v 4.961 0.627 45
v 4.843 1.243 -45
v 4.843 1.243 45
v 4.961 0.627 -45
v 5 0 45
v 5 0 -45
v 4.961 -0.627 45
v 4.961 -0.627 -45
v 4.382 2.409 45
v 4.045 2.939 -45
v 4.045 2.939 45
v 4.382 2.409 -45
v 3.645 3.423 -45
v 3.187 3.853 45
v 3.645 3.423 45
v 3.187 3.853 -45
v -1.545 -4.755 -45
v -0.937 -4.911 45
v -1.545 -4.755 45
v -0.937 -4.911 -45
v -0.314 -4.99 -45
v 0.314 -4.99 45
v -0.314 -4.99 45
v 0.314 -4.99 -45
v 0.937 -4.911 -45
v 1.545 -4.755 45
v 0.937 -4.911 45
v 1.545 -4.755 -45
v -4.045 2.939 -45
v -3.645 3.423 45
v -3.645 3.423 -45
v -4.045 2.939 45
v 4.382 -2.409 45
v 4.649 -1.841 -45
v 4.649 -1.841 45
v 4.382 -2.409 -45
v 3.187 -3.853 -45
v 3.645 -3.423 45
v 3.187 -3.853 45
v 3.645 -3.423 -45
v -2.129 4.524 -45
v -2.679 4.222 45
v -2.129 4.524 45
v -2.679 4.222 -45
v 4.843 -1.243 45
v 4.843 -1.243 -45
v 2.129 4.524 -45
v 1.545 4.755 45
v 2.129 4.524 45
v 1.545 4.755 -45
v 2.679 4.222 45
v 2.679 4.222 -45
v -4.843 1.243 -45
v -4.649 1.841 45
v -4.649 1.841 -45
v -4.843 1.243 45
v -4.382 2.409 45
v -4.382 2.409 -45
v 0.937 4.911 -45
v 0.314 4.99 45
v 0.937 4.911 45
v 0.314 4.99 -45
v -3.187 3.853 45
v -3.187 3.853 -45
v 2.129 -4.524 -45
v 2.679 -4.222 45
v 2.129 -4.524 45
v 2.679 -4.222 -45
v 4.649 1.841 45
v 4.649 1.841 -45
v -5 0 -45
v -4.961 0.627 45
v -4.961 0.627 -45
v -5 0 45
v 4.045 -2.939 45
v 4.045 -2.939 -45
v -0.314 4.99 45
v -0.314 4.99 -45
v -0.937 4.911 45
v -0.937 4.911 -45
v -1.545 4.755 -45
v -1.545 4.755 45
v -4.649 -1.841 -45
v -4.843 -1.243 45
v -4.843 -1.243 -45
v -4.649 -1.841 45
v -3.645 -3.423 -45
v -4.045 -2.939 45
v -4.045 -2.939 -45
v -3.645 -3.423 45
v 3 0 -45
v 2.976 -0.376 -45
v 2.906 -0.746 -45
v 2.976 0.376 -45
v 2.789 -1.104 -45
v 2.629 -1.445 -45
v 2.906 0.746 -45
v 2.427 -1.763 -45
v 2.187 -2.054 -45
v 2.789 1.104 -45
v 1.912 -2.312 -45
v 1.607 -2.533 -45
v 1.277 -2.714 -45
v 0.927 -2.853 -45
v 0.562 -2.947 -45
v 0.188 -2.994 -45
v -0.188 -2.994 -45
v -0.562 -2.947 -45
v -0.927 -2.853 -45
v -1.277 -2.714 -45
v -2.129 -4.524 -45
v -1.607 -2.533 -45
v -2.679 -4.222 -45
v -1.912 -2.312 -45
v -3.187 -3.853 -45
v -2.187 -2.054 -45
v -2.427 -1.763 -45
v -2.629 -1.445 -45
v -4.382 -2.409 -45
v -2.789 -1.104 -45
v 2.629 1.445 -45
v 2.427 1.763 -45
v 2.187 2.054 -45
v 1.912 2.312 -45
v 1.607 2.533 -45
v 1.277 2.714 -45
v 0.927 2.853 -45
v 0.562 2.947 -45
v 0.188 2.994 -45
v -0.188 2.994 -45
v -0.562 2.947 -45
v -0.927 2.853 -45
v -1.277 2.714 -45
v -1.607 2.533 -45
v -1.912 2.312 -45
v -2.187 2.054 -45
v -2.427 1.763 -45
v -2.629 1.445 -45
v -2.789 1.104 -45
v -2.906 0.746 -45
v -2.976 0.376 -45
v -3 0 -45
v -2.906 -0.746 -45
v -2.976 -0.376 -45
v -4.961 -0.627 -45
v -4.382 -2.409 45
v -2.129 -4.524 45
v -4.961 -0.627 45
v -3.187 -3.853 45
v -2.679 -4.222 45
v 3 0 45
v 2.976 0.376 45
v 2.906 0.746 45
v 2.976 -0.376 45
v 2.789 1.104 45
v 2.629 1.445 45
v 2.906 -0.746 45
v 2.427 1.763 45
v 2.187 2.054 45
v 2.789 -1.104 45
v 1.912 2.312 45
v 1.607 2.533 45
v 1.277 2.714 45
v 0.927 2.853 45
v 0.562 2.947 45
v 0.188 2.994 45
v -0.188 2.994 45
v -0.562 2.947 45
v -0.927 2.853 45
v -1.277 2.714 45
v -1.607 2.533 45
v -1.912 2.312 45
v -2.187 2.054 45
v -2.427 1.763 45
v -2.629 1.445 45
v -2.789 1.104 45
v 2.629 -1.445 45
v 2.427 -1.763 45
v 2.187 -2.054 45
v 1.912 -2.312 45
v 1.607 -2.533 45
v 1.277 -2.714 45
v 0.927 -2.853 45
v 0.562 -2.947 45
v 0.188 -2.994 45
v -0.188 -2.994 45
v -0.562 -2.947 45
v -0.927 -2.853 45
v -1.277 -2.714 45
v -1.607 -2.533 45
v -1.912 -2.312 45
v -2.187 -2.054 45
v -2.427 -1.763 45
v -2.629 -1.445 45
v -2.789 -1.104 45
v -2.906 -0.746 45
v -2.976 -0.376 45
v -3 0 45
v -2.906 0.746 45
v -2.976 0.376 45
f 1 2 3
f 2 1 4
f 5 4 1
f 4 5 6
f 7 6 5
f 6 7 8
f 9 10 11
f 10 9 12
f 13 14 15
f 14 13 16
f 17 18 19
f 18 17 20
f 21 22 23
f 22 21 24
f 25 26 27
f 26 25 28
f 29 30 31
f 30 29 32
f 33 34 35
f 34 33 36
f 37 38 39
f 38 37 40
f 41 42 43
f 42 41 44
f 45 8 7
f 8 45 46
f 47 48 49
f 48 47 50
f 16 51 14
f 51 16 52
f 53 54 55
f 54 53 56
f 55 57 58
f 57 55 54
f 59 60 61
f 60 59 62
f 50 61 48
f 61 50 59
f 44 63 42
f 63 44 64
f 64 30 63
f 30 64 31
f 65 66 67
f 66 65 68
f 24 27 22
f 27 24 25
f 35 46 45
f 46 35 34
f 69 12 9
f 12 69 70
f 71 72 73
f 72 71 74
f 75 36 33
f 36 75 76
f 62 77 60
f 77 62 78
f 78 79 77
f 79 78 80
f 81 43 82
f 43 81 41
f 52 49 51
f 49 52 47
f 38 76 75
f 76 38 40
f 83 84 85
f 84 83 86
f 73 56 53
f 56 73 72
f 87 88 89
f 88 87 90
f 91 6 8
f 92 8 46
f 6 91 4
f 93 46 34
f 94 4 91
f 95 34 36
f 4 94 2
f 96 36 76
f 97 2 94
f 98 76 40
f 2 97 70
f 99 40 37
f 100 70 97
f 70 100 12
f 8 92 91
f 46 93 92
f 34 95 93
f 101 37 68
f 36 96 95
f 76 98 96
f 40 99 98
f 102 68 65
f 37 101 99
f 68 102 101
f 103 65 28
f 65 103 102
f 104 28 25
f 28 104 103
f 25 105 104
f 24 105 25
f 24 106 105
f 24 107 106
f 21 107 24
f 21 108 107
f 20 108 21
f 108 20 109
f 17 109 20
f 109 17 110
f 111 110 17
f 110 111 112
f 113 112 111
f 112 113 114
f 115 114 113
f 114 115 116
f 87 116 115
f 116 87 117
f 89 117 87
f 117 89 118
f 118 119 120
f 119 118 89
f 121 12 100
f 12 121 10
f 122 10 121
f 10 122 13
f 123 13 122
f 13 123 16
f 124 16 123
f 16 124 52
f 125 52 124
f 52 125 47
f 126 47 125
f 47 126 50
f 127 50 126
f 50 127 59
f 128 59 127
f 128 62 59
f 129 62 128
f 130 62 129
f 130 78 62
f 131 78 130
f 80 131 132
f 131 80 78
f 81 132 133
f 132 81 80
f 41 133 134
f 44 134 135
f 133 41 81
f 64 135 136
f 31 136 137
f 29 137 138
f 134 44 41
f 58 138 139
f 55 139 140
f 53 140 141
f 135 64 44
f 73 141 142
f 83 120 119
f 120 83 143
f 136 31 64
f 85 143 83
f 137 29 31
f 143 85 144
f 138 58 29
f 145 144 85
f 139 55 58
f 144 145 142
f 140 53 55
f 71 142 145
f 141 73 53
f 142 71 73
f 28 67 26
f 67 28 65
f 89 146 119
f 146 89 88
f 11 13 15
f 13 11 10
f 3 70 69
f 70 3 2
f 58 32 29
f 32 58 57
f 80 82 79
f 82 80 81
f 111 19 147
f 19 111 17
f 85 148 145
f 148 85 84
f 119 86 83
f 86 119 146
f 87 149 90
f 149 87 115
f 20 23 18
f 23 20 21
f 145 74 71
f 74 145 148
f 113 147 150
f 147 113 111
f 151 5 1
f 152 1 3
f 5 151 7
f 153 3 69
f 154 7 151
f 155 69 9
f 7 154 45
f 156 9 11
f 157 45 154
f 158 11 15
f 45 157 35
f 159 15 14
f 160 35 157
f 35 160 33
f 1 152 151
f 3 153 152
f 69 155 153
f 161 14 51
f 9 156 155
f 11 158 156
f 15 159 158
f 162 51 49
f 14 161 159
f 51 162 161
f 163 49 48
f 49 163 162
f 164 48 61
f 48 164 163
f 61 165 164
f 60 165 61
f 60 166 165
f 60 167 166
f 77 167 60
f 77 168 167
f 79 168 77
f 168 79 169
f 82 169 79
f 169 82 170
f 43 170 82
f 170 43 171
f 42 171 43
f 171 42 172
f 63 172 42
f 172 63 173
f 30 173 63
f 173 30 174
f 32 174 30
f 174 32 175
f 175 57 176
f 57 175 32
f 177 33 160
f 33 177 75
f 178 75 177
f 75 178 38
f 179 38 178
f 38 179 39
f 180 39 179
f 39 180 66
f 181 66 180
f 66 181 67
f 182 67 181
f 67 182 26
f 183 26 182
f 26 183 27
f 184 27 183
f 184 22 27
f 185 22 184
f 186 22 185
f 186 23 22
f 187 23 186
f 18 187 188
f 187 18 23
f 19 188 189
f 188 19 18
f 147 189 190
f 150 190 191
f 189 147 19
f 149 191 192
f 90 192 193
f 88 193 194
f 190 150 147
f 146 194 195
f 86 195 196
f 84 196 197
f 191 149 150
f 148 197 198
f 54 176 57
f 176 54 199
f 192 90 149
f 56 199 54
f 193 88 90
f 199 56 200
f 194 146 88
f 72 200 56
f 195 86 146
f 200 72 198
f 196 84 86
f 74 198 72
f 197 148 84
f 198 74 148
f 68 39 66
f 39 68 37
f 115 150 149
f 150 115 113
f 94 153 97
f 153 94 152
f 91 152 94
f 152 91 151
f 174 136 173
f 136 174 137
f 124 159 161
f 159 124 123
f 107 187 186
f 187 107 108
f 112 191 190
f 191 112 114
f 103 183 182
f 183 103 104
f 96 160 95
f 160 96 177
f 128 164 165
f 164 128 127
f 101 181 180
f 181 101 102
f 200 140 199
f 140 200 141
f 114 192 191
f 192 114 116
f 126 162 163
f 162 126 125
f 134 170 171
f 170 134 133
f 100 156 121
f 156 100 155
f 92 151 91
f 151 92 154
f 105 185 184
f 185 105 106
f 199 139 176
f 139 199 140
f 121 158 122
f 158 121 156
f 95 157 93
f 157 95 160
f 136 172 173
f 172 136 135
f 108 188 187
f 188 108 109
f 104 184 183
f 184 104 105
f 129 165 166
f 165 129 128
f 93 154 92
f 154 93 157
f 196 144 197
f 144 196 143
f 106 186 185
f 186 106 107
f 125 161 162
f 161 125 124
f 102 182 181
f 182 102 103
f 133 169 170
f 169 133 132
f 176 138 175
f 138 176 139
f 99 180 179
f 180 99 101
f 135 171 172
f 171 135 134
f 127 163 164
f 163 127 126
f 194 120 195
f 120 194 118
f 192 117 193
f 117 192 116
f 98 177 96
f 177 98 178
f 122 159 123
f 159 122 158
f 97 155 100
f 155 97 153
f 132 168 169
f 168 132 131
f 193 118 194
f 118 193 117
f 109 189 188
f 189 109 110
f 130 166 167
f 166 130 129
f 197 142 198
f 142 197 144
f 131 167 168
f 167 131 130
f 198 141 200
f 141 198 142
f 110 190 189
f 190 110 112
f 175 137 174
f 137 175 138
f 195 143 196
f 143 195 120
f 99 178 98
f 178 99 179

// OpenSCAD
$fn = 50;


difference() {
	union() {
		translate(v = [0, 0, -45.0000000000]) {
			cylinder(h = 90, r = 5.0000000000);
		}
	}
	union() {
		translate(v = [0, 0, -100.0000000000]) {
			cylinder(h = 200, r = 3.0000000000);
		}
	}
}
